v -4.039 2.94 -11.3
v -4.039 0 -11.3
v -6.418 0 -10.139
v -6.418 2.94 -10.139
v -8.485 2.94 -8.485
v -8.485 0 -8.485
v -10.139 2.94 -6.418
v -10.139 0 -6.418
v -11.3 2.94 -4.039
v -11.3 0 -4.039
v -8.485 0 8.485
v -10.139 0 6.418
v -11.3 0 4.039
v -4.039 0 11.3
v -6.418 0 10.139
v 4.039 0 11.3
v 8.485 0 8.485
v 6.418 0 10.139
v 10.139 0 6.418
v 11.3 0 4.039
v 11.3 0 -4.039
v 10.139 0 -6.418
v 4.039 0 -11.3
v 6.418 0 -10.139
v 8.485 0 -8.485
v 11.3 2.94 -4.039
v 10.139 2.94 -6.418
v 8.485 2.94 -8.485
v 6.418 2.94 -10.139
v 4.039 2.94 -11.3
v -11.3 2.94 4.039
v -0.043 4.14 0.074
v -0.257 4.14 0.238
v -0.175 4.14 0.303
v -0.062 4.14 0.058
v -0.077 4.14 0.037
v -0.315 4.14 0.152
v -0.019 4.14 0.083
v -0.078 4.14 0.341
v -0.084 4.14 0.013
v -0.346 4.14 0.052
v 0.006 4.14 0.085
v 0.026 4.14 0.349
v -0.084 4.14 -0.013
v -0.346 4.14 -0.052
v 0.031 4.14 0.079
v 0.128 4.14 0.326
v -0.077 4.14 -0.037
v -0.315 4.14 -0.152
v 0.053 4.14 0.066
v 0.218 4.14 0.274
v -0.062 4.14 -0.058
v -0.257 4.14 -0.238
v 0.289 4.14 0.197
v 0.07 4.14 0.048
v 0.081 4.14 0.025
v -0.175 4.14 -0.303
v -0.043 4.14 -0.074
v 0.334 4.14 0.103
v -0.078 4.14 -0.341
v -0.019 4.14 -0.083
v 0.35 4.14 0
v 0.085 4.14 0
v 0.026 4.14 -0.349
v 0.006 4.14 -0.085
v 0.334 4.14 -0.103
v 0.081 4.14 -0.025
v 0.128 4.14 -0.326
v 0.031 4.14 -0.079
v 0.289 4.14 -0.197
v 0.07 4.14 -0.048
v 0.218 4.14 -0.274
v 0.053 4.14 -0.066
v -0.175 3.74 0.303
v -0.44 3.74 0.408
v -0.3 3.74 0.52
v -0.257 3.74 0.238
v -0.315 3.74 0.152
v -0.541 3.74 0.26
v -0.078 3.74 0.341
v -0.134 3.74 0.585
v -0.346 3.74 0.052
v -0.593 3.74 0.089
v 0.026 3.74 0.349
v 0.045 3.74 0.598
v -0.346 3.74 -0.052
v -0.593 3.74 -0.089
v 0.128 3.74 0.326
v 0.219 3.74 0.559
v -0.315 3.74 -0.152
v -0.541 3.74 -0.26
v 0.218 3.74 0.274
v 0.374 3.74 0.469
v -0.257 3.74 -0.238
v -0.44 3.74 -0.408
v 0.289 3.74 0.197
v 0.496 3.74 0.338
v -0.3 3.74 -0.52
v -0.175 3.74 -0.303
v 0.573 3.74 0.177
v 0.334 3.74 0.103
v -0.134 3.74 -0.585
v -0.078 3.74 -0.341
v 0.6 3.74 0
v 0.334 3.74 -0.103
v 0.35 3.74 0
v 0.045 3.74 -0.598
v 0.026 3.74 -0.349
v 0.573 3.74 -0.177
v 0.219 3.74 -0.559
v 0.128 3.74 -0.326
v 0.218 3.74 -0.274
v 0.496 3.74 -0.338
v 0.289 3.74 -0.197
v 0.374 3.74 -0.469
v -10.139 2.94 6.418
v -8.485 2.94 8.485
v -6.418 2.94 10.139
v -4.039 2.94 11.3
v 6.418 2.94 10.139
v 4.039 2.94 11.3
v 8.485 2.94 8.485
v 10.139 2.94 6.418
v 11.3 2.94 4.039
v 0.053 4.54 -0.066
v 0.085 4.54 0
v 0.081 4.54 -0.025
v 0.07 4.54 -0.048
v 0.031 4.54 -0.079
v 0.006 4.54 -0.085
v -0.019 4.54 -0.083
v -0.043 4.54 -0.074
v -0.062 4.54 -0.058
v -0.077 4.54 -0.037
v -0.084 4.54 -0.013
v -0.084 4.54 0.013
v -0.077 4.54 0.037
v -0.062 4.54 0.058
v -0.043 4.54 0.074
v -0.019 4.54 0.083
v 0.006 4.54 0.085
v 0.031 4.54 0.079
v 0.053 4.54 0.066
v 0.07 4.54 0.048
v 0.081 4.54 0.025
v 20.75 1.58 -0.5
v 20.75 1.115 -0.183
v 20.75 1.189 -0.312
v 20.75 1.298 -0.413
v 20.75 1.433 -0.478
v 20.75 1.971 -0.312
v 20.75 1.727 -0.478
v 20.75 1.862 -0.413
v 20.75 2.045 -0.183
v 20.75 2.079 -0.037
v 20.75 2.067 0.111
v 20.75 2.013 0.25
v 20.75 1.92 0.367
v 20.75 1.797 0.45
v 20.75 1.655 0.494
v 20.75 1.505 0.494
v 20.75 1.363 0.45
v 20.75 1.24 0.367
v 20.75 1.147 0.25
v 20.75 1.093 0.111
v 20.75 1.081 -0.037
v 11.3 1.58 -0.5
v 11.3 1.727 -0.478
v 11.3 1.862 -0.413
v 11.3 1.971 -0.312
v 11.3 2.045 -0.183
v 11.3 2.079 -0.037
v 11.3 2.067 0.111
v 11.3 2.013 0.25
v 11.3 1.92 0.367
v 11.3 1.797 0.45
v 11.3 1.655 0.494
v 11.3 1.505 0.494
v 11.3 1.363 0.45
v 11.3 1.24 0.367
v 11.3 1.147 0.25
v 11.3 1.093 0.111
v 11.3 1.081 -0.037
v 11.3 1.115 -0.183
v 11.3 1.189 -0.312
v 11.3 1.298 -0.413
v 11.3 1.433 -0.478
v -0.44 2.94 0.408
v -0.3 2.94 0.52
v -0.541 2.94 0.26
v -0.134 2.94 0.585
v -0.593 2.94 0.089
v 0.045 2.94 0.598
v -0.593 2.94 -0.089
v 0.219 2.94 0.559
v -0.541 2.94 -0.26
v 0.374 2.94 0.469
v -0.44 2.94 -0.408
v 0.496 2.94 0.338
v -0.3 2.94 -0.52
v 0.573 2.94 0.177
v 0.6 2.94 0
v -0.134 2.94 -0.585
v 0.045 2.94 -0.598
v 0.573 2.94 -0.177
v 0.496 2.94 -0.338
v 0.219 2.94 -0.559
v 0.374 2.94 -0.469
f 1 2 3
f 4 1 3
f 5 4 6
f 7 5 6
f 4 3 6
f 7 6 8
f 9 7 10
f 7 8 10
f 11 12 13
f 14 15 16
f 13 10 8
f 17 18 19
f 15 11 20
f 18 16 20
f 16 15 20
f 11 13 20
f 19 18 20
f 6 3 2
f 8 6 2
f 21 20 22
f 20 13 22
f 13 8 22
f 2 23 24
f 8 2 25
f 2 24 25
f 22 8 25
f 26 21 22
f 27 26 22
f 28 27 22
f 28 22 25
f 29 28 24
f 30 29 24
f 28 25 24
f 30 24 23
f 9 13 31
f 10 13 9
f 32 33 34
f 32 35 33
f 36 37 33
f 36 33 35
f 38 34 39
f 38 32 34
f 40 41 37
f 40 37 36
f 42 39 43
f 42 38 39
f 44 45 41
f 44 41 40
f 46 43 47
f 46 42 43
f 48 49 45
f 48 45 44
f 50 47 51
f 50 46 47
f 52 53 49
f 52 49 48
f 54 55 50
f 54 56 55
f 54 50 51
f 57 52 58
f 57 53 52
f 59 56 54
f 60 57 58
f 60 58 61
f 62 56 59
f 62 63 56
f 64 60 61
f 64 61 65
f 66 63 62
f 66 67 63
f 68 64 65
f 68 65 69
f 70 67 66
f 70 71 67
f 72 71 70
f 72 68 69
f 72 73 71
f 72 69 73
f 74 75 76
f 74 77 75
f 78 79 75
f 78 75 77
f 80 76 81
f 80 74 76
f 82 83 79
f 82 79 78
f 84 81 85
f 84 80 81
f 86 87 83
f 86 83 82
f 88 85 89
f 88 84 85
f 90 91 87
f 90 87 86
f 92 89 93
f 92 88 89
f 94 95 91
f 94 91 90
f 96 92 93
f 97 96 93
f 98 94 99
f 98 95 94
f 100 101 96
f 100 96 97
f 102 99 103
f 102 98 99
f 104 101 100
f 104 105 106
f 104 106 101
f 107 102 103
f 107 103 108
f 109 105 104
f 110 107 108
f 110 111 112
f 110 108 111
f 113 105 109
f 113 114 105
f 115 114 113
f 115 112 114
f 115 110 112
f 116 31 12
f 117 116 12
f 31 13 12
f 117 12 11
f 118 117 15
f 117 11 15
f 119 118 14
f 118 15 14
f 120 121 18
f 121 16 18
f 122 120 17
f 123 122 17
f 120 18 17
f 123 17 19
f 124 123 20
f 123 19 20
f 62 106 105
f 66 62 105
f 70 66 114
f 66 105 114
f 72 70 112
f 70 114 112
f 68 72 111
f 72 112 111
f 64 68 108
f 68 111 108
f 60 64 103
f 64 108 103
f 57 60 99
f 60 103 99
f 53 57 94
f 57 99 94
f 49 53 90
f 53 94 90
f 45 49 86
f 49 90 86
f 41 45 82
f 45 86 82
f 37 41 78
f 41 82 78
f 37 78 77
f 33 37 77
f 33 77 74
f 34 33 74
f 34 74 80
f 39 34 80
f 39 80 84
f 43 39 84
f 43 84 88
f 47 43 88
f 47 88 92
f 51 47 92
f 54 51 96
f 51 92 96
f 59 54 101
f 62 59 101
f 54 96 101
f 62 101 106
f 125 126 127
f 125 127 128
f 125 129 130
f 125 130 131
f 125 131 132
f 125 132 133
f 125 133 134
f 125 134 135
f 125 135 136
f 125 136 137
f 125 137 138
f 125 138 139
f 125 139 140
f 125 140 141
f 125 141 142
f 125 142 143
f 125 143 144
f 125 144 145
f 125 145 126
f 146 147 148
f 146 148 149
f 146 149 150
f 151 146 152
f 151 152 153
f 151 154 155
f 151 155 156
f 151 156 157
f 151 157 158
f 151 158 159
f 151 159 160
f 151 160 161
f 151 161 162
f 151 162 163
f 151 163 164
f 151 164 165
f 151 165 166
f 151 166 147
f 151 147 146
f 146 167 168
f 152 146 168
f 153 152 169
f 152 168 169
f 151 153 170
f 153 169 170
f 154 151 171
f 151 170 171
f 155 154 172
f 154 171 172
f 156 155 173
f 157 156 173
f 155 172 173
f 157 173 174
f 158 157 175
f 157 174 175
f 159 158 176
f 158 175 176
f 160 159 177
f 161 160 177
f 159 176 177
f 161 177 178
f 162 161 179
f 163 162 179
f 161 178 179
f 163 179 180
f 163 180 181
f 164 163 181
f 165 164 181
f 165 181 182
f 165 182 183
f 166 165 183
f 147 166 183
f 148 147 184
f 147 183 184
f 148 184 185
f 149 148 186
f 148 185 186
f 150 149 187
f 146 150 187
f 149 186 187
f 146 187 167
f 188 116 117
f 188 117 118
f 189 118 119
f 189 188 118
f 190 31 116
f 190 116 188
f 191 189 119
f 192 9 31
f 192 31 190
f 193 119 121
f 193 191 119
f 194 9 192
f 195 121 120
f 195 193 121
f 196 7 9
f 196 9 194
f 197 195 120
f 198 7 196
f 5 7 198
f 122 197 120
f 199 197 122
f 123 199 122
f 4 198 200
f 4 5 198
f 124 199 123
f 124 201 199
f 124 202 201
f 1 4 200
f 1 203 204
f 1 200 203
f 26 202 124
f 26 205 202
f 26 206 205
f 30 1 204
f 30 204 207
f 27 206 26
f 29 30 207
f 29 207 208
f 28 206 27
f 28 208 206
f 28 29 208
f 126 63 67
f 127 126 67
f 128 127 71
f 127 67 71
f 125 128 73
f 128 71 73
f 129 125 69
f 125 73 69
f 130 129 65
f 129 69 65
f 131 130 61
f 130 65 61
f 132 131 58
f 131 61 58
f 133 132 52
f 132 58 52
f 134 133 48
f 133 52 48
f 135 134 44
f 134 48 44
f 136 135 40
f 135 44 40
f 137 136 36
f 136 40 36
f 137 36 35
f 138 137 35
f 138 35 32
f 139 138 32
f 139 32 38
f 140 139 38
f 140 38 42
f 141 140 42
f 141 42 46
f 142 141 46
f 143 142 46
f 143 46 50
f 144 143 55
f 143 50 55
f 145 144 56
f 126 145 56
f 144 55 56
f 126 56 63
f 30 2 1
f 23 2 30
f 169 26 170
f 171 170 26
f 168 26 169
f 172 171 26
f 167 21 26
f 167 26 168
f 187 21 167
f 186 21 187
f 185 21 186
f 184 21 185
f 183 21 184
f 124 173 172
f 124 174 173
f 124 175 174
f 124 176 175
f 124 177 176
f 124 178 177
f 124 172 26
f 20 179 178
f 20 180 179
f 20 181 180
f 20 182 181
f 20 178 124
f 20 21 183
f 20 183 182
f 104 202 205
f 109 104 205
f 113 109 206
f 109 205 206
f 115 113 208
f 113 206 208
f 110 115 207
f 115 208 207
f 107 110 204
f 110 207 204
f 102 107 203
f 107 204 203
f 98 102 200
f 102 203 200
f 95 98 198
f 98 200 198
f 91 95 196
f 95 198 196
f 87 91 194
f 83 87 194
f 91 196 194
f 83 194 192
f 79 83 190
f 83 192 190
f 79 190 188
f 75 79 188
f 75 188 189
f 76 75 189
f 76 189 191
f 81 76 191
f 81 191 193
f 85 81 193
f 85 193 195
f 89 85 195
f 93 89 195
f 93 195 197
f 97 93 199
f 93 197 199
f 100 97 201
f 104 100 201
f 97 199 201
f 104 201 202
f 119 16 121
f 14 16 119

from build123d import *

# Parameters (mm, degrees)
SKETCH1_R           = 12
BOSS_EXTRUDE1_DEPTH = 2.94
CUT_EXTRUDE1_DEPTH  = 2.94
CUT_EXTRUDE2_DEPTH  = 2.94
SKETCH7_R           = 0.5
BOSS_EXTRUDE4_DEPTH = 9.45
SKETCH8_R           = 0.6
BOSS_EXTRUDE5_DEPTH = 0.8
SKETCH9_R           = 0.35
BOSS_EXTRUDE6_DEPTH = 0.4
SKETCH10_R          = 0.085
BOSS_EXTRUDE7_DEPTH = 0.4


with BuildPart() as part:
    # Sketch1 → Boss-Extrude1 (new body)
    with BuildSketch(Plane(origin=(0, 0, 0), x_dir=(1, 0, 0), z_dir=(0, 1, 0))):
        Circle(SKETCH1_R)
    extrude(amount=BOSS_EXTRUDE1_DEPTH)

    # Sketch2 → Cut-Extrude1 (cut)
    with BuildSketch(Plane(origin=(0, 0, 0), x_dir=(1, 0, 0), z_dir=(0, 1, 0))):
        Polygon((-11.3, 0), (-11.3, 4.756450674), (-12.628390715, 4.756450674), (-12.628390715, -4.839844075), (-11.3, -4.839844075), align=None)
        Polygon((12.628390715, -4.839844075), (12.628390715, 4.756450674), (11.3, 4.756450674), (11.3, 0), (11.3, -4.839844075), align=None)
    extrude(amount=CUT_EXTRUDE1_DEPTH, mode=Mode.SUBTRACT)

    # Sketch3 → Cut-Extrude2 (cut)
    with BuildSketch(Plane(origin=(0, 0, 0), x_dir=(1, 0, 0), z_dir=(0, 1, 0))):
        Polygon((0, -11.3), (4.998184115, -11.3), (4.998184115, -12.991968643), (-5.196787457, -12.991968643), (-5.196787457, -11.3), align=None)
        Polygon((-5.196787457, 12.991968643), (4.998184115, 12.991968643), (4.998184115, 11.3), (0, 11.3), (-5.196787457, 11.3), align=None)
    extrude(amount=CUT_EXTRUDE2_DEPTH, mode=Mode.SUBTRACT)

    # Sketch7 → Boss-Extrude4 (add)
    with BuildSketch(Plane(origin=(11.3, 0, 0), x_dir=(0, 0, -1), z_dir=(1, 0, 0))):
        with Locations((0, 1.58)):
            Circle(SKETCH7_R)
    extrude(amount=BOSS_EXTRUDE4_DEPTH)

    # Sketch8 → Boss-Extrude5 (add)
    with BuildSketch(Plane(origin=(0, 2.94, 0), x_dir=(1, 0, 0), z_dir=(0, 1, 0))):
        Circle(SKETCH8_R)
    extrude(amount=BOSS_EXTRUDE5_DEPTH)

    # Sketch9 → Boss-Extrude6 (add)
    with BuildSketch(Plane(origin=(0, 3.74, 0), x_dir=(1, 0, 0), z_dir=(0, 1, 0))):
        Circle(SKETCH9_R)
    extrude(amount=BOSS_EXTRUDE6_DEPTH)

    # Sketch10 → Boss-Extrude7 (add)
    with BuildSketch(Plane(origin=(0, 4.14, 0), x_dir=(1, 0, 0), z_dir=(0, 1, 0))):
        Circle(SKETCH10_R)
    extrude(amount=BOSS_EXTRUDE7_DEPTH)


solid = part.part
